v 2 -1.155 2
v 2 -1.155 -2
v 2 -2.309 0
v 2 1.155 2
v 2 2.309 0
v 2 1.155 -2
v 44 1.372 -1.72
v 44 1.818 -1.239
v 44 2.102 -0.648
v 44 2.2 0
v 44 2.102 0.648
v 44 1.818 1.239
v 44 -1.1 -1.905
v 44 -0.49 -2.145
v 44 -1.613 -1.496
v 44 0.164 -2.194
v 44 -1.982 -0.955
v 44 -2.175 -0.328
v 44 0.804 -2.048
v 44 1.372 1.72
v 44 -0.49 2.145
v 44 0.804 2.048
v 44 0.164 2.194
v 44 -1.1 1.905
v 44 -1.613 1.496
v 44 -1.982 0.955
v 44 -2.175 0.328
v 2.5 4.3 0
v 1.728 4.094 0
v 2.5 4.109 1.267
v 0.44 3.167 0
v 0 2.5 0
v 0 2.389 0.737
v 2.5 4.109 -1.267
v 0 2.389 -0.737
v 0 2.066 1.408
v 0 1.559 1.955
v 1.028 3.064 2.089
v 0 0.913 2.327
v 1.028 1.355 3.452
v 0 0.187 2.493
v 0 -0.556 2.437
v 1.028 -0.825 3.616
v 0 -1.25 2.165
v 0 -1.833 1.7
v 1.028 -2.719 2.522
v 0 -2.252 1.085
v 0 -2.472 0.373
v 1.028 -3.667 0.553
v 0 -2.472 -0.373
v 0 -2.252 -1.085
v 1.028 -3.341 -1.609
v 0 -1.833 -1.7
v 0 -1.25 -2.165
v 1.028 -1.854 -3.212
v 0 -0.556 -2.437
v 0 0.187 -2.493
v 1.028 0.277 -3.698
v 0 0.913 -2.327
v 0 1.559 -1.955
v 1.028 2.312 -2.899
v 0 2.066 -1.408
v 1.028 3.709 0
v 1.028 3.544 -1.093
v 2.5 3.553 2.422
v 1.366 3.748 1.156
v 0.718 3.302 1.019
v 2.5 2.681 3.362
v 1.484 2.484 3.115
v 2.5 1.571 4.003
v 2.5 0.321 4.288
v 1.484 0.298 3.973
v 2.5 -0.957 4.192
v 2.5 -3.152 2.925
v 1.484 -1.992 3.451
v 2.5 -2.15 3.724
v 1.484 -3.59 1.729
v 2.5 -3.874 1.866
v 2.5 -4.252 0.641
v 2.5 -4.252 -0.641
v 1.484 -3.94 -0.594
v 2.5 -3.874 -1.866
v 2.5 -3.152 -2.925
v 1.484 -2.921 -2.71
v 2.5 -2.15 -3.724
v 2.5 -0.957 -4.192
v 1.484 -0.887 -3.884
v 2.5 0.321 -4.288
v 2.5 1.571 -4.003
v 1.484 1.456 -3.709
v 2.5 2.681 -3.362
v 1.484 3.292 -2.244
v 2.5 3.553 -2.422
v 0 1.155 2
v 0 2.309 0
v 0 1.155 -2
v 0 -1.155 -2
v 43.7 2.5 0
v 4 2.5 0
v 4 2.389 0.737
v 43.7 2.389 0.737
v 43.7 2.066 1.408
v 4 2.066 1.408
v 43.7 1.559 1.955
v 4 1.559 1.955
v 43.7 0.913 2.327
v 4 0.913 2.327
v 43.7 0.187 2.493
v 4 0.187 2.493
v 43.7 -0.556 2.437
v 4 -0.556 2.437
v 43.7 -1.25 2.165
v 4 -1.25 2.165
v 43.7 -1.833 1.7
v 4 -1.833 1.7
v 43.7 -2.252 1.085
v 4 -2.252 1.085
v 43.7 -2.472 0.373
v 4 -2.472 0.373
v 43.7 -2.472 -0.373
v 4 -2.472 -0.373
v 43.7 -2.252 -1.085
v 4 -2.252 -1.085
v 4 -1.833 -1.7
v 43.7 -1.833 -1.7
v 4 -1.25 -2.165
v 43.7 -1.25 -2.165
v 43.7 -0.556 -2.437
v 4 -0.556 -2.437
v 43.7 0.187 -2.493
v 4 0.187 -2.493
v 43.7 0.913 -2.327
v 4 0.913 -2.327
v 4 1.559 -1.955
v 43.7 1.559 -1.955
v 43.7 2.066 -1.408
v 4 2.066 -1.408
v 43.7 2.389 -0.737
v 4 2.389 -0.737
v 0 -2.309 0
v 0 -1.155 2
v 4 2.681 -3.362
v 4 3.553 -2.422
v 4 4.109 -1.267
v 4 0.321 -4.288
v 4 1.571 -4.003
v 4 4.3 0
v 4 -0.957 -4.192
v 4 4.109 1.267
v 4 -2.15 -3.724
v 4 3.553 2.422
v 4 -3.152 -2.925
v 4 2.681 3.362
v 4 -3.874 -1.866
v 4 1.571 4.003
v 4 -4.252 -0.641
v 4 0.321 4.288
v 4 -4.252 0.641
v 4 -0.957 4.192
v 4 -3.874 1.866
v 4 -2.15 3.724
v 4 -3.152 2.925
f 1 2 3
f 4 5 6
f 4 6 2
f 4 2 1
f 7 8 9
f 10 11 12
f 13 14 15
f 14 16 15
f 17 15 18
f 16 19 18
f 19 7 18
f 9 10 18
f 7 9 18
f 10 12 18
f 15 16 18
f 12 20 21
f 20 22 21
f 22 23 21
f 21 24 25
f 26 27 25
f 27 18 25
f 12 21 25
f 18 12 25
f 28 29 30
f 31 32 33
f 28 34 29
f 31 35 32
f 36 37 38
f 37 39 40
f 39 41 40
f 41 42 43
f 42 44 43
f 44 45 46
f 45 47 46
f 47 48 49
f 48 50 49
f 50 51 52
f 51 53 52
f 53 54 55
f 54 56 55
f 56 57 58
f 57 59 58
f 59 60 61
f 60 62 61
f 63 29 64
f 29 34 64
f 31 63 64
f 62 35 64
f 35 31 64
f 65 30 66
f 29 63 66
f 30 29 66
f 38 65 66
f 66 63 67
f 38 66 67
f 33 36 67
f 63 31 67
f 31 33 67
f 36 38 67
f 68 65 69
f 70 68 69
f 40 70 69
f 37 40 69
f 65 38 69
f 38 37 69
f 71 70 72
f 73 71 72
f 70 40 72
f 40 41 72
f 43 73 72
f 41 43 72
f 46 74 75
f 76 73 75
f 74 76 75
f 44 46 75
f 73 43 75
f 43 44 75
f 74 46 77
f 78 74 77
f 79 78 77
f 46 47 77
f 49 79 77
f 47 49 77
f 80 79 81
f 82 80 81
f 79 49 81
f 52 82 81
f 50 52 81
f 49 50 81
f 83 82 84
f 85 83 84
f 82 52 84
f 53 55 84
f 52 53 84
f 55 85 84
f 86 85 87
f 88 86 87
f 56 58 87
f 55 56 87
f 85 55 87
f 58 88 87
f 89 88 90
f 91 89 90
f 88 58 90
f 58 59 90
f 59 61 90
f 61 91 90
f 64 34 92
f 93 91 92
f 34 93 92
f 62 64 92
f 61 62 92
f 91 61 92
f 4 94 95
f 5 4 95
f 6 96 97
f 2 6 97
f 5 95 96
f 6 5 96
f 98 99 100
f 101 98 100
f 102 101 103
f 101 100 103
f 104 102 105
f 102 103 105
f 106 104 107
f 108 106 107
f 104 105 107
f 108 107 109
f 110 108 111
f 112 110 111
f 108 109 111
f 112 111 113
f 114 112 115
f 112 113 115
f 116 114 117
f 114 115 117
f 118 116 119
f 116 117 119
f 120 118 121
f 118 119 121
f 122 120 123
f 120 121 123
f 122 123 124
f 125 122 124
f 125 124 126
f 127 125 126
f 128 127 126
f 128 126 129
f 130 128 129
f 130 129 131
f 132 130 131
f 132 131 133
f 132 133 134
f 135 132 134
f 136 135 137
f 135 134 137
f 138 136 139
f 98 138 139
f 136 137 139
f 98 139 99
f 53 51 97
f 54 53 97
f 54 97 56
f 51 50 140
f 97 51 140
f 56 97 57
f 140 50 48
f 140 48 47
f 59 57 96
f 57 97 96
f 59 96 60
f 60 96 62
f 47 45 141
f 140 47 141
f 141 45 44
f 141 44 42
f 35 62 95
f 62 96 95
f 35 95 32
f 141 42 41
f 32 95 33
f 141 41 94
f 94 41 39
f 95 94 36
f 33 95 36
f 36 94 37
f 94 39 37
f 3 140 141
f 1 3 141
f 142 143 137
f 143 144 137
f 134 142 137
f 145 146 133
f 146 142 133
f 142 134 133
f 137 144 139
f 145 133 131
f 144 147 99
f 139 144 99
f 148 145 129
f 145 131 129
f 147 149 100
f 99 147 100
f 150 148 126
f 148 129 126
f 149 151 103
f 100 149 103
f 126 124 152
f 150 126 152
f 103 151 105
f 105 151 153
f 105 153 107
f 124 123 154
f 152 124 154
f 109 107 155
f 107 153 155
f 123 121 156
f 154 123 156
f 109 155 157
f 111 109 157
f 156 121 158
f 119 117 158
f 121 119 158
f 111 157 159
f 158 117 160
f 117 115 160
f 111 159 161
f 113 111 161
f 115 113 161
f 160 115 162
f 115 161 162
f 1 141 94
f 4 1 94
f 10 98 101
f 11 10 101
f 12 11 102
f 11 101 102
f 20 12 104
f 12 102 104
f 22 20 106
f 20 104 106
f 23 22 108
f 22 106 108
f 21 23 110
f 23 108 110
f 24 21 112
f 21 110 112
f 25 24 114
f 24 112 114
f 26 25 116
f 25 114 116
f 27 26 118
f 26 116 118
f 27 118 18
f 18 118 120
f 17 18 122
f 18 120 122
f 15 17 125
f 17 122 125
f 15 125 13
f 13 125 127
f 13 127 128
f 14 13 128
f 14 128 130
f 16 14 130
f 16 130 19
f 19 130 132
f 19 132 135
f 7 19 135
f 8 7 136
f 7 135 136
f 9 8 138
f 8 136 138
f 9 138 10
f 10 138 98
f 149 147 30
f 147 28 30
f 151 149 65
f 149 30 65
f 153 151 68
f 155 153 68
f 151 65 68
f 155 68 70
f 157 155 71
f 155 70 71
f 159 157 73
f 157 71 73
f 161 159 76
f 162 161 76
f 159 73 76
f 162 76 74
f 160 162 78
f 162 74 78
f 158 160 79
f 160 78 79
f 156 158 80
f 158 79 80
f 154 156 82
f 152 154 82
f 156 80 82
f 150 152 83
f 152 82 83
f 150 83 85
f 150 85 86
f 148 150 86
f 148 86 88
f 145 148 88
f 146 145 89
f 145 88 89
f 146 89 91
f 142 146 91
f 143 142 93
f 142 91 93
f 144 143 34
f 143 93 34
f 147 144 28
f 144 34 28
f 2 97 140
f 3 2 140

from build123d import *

# Parameters (mm, degrees)
CHAMFER1_SIZE      = 0.3
CUT_EXTRUDE1_DEPTH = 2


with BuildPart() as part:
    # Sketch1 → Revolve1 (revolve)
    with BuildSketch(Plane.XY):
        with BuildLine():
            Line((0, 0), (44, 0))
            Line((44, 0), (44, 2.5))
            Line((44, 2.5), (4, 2.5))
            Line((4, 2.5), (4, 4.3))
            Line((4, 4.3), (2.5, 4.3))
            ThreePointArc((2.5, 4.3), (1.027835828, 3.70856135), (0, 2.5))
            Line((0, 2.5), (0, 0))
        make_face()
    revolve(axis=Axis((0, 0, 0), (1, 0, 0)))

    # Chamfer1
    chamfer1_edges = [part.edges().sort_by_distance(p)[0] for p in [
        (44, -2.5, 0),
    ]]
    chamfer(chamfer1_edges, length=CHAMFER1_SIZE)

    # Sketch2 → Cut-Extrude1 (cut)
    with BuildSketch(Plane.ZY):
        Polygon((0, 2.309401077), (-2, 1.154700538), (-2, -1.154700538), (0, -2.309401077), (2, -1.154700538), (2, 1.154700538), align=None)
    extrude(amount=-CUT_EXTRUDE1_DEPTH, mode=Mode.SUBTRACT)


solid = part.part
